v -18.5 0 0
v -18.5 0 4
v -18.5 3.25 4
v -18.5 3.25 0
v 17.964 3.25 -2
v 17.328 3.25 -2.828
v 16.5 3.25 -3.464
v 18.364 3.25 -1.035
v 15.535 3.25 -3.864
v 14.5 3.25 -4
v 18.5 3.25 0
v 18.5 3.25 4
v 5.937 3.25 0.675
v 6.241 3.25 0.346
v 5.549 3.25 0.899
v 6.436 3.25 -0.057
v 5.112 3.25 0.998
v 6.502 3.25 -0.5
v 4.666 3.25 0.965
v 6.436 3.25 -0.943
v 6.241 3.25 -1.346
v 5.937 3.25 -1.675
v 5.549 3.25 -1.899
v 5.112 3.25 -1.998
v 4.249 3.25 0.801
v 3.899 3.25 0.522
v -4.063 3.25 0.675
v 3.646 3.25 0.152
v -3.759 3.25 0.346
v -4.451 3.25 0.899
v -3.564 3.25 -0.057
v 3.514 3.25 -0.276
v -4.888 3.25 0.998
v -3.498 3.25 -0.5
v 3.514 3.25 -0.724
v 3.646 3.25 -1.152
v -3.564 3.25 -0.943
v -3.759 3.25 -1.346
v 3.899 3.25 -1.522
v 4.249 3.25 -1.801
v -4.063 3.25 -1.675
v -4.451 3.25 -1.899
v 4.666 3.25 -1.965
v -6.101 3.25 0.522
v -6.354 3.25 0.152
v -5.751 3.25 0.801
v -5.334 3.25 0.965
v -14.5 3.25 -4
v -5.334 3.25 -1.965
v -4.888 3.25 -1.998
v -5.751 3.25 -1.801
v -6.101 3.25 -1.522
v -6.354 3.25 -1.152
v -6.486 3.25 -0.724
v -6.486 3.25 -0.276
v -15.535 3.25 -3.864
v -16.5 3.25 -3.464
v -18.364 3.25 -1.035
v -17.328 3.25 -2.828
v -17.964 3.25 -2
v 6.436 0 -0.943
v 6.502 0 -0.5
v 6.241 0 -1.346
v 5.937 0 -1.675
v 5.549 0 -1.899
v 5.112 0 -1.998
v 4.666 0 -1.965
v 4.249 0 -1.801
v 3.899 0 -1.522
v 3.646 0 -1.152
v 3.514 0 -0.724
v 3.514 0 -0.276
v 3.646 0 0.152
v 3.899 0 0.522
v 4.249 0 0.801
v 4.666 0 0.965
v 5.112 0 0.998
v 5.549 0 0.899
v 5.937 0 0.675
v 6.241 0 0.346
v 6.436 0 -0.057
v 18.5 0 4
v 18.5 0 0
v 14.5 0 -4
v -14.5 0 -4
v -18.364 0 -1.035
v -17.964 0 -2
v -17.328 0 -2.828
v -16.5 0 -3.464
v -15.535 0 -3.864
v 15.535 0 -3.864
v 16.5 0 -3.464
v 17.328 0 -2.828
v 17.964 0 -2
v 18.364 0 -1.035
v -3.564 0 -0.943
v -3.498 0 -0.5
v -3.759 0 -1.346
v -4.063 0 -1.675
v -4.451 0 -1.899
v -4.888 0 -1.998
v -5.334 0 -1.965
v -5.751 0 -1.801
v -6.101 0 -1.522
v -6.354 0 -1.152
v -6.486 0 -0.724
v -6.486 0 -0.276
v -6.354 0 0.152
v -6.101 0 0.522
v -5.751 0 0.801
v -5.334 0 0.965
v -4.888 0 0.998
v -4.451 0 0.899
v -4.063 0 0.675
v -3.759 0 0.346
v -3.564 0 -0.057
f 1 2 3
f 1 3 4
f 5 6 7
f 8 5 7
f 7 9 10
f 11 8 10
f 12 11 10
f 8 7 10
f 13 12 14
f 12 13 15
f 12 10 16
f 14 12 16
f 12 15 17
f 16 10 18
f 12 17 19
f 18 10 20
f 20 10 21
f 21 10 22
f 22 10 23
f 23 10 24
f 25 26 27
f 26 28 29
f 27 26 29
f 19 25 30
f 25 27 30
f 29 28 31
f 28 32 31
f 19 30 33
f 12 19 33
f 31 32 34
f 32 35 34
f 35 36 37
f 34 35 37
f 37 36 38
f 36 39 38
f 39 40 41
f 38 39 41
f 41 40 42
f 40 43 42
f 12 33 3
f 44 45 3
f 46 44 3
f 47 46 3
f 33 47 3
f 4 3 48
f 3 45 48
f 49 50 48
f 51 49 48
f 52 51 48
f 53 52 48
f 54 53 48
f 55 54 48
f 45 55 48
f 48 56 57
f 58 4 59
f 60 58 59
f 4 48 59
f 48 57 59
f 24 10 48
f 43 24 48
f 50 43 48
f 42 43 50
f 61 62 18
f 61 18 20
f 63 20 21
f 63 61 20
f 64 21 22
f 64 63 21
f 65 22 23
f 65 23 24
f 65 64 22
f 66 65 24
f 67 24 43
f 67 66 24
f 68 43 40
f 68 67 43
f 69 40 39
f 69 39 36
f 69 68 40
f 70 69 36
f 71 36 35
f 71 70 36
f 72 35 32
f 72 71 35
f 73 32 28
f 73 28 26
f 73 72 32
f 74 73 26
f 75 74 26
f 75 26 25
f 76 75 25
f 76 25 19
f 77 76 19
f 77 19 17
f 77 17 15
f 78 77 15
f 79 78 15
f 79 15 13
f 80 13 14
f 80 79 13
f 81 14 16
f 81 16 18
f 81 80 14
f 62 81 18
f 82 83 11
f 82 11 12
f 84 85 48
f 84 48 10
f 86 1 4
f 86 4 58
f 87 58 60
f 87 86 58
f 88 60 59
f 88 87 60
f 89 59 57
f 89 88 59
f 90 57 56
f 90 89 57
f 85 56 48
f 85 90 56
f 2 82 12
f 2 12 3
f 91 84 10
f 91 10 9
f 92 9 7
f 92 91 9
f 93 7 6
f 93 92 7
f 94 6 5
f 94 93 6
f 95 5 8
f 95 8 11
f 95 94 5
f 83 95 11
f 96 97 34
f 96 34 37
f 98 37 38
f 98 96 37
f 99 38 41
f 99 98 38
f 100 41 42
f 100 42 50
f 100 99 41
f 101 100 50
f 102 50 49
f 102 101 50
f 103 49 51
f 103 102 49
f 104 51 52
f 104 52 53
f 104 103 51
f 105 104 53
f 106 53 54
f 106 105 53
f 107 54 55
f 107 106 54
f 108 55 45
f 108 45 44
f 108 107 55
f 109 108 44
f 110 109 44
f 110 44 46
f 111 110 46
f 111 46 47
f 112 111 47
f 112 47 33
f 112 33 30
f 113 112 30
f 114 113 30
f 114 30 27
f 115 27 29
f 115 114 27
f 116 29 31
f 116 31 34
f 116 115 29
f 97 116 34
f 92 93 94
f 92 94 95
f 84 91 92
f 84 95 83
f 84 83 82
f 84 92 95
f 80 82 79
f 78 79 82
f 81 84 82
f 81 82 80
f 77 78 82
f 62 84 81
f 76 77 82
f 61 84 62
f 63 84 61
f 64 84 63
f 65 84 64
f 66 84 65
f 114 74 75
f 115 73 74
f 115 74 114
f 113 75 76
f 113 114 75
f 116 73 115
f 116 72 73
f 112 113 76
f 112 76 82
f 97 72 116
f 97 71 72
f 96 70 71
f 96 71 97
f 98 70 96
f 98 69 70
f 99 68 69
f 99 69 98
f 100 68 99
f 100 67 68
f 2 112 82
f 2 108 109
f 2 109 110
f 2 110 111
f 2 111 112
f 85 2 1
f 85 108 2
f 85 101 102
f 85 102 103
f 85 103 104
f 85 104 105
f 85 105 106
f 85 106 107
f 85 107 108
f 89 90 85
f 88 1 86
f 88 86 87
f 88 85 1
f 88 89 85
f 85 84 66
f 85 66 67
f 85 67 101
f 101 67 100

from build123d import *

# Parameters (mm, degrees)
SKETCH1_R           = 1.5025
BOSS_EXTRUDE1_DEPTH = 3.25


with BuildPart() as part:
    # Sketch1 → Boss-Extrude1 (new body)
    with BuildSketch(Plane(origin=(0, 0, 0), x_dir=(1, 0, 0), z_dir=(0, 1, 0))):
        with BuildLine():
            Line((-14.5, 4), (14.5, 4))
            ThreePointArc((14.5, 4), (17.328427125, 2.828427125), (18.5, 0))
            Line((18.5, 0), (18.5, -4))
            Line((18.5, -4), (-18.5, -4))
            Line((-18.5, -4), (-18.5, 0))
            ThreePointArc((-18.5, 0), (-17.328427125, 2.828427125), (-14.5, 4))
        make_face()
        with Locations((-5, 0.5)):
            Circle(SKETCH1_R, mode=Mode.SUBTRACT)
        with Locations((5, 0.5)):
            Circle(SKETCH1_R, mode=Mode.SUBTRACT)
    extrude(amount=BOSS_EXTRUDE1_DEPTH)


solid = part.part
